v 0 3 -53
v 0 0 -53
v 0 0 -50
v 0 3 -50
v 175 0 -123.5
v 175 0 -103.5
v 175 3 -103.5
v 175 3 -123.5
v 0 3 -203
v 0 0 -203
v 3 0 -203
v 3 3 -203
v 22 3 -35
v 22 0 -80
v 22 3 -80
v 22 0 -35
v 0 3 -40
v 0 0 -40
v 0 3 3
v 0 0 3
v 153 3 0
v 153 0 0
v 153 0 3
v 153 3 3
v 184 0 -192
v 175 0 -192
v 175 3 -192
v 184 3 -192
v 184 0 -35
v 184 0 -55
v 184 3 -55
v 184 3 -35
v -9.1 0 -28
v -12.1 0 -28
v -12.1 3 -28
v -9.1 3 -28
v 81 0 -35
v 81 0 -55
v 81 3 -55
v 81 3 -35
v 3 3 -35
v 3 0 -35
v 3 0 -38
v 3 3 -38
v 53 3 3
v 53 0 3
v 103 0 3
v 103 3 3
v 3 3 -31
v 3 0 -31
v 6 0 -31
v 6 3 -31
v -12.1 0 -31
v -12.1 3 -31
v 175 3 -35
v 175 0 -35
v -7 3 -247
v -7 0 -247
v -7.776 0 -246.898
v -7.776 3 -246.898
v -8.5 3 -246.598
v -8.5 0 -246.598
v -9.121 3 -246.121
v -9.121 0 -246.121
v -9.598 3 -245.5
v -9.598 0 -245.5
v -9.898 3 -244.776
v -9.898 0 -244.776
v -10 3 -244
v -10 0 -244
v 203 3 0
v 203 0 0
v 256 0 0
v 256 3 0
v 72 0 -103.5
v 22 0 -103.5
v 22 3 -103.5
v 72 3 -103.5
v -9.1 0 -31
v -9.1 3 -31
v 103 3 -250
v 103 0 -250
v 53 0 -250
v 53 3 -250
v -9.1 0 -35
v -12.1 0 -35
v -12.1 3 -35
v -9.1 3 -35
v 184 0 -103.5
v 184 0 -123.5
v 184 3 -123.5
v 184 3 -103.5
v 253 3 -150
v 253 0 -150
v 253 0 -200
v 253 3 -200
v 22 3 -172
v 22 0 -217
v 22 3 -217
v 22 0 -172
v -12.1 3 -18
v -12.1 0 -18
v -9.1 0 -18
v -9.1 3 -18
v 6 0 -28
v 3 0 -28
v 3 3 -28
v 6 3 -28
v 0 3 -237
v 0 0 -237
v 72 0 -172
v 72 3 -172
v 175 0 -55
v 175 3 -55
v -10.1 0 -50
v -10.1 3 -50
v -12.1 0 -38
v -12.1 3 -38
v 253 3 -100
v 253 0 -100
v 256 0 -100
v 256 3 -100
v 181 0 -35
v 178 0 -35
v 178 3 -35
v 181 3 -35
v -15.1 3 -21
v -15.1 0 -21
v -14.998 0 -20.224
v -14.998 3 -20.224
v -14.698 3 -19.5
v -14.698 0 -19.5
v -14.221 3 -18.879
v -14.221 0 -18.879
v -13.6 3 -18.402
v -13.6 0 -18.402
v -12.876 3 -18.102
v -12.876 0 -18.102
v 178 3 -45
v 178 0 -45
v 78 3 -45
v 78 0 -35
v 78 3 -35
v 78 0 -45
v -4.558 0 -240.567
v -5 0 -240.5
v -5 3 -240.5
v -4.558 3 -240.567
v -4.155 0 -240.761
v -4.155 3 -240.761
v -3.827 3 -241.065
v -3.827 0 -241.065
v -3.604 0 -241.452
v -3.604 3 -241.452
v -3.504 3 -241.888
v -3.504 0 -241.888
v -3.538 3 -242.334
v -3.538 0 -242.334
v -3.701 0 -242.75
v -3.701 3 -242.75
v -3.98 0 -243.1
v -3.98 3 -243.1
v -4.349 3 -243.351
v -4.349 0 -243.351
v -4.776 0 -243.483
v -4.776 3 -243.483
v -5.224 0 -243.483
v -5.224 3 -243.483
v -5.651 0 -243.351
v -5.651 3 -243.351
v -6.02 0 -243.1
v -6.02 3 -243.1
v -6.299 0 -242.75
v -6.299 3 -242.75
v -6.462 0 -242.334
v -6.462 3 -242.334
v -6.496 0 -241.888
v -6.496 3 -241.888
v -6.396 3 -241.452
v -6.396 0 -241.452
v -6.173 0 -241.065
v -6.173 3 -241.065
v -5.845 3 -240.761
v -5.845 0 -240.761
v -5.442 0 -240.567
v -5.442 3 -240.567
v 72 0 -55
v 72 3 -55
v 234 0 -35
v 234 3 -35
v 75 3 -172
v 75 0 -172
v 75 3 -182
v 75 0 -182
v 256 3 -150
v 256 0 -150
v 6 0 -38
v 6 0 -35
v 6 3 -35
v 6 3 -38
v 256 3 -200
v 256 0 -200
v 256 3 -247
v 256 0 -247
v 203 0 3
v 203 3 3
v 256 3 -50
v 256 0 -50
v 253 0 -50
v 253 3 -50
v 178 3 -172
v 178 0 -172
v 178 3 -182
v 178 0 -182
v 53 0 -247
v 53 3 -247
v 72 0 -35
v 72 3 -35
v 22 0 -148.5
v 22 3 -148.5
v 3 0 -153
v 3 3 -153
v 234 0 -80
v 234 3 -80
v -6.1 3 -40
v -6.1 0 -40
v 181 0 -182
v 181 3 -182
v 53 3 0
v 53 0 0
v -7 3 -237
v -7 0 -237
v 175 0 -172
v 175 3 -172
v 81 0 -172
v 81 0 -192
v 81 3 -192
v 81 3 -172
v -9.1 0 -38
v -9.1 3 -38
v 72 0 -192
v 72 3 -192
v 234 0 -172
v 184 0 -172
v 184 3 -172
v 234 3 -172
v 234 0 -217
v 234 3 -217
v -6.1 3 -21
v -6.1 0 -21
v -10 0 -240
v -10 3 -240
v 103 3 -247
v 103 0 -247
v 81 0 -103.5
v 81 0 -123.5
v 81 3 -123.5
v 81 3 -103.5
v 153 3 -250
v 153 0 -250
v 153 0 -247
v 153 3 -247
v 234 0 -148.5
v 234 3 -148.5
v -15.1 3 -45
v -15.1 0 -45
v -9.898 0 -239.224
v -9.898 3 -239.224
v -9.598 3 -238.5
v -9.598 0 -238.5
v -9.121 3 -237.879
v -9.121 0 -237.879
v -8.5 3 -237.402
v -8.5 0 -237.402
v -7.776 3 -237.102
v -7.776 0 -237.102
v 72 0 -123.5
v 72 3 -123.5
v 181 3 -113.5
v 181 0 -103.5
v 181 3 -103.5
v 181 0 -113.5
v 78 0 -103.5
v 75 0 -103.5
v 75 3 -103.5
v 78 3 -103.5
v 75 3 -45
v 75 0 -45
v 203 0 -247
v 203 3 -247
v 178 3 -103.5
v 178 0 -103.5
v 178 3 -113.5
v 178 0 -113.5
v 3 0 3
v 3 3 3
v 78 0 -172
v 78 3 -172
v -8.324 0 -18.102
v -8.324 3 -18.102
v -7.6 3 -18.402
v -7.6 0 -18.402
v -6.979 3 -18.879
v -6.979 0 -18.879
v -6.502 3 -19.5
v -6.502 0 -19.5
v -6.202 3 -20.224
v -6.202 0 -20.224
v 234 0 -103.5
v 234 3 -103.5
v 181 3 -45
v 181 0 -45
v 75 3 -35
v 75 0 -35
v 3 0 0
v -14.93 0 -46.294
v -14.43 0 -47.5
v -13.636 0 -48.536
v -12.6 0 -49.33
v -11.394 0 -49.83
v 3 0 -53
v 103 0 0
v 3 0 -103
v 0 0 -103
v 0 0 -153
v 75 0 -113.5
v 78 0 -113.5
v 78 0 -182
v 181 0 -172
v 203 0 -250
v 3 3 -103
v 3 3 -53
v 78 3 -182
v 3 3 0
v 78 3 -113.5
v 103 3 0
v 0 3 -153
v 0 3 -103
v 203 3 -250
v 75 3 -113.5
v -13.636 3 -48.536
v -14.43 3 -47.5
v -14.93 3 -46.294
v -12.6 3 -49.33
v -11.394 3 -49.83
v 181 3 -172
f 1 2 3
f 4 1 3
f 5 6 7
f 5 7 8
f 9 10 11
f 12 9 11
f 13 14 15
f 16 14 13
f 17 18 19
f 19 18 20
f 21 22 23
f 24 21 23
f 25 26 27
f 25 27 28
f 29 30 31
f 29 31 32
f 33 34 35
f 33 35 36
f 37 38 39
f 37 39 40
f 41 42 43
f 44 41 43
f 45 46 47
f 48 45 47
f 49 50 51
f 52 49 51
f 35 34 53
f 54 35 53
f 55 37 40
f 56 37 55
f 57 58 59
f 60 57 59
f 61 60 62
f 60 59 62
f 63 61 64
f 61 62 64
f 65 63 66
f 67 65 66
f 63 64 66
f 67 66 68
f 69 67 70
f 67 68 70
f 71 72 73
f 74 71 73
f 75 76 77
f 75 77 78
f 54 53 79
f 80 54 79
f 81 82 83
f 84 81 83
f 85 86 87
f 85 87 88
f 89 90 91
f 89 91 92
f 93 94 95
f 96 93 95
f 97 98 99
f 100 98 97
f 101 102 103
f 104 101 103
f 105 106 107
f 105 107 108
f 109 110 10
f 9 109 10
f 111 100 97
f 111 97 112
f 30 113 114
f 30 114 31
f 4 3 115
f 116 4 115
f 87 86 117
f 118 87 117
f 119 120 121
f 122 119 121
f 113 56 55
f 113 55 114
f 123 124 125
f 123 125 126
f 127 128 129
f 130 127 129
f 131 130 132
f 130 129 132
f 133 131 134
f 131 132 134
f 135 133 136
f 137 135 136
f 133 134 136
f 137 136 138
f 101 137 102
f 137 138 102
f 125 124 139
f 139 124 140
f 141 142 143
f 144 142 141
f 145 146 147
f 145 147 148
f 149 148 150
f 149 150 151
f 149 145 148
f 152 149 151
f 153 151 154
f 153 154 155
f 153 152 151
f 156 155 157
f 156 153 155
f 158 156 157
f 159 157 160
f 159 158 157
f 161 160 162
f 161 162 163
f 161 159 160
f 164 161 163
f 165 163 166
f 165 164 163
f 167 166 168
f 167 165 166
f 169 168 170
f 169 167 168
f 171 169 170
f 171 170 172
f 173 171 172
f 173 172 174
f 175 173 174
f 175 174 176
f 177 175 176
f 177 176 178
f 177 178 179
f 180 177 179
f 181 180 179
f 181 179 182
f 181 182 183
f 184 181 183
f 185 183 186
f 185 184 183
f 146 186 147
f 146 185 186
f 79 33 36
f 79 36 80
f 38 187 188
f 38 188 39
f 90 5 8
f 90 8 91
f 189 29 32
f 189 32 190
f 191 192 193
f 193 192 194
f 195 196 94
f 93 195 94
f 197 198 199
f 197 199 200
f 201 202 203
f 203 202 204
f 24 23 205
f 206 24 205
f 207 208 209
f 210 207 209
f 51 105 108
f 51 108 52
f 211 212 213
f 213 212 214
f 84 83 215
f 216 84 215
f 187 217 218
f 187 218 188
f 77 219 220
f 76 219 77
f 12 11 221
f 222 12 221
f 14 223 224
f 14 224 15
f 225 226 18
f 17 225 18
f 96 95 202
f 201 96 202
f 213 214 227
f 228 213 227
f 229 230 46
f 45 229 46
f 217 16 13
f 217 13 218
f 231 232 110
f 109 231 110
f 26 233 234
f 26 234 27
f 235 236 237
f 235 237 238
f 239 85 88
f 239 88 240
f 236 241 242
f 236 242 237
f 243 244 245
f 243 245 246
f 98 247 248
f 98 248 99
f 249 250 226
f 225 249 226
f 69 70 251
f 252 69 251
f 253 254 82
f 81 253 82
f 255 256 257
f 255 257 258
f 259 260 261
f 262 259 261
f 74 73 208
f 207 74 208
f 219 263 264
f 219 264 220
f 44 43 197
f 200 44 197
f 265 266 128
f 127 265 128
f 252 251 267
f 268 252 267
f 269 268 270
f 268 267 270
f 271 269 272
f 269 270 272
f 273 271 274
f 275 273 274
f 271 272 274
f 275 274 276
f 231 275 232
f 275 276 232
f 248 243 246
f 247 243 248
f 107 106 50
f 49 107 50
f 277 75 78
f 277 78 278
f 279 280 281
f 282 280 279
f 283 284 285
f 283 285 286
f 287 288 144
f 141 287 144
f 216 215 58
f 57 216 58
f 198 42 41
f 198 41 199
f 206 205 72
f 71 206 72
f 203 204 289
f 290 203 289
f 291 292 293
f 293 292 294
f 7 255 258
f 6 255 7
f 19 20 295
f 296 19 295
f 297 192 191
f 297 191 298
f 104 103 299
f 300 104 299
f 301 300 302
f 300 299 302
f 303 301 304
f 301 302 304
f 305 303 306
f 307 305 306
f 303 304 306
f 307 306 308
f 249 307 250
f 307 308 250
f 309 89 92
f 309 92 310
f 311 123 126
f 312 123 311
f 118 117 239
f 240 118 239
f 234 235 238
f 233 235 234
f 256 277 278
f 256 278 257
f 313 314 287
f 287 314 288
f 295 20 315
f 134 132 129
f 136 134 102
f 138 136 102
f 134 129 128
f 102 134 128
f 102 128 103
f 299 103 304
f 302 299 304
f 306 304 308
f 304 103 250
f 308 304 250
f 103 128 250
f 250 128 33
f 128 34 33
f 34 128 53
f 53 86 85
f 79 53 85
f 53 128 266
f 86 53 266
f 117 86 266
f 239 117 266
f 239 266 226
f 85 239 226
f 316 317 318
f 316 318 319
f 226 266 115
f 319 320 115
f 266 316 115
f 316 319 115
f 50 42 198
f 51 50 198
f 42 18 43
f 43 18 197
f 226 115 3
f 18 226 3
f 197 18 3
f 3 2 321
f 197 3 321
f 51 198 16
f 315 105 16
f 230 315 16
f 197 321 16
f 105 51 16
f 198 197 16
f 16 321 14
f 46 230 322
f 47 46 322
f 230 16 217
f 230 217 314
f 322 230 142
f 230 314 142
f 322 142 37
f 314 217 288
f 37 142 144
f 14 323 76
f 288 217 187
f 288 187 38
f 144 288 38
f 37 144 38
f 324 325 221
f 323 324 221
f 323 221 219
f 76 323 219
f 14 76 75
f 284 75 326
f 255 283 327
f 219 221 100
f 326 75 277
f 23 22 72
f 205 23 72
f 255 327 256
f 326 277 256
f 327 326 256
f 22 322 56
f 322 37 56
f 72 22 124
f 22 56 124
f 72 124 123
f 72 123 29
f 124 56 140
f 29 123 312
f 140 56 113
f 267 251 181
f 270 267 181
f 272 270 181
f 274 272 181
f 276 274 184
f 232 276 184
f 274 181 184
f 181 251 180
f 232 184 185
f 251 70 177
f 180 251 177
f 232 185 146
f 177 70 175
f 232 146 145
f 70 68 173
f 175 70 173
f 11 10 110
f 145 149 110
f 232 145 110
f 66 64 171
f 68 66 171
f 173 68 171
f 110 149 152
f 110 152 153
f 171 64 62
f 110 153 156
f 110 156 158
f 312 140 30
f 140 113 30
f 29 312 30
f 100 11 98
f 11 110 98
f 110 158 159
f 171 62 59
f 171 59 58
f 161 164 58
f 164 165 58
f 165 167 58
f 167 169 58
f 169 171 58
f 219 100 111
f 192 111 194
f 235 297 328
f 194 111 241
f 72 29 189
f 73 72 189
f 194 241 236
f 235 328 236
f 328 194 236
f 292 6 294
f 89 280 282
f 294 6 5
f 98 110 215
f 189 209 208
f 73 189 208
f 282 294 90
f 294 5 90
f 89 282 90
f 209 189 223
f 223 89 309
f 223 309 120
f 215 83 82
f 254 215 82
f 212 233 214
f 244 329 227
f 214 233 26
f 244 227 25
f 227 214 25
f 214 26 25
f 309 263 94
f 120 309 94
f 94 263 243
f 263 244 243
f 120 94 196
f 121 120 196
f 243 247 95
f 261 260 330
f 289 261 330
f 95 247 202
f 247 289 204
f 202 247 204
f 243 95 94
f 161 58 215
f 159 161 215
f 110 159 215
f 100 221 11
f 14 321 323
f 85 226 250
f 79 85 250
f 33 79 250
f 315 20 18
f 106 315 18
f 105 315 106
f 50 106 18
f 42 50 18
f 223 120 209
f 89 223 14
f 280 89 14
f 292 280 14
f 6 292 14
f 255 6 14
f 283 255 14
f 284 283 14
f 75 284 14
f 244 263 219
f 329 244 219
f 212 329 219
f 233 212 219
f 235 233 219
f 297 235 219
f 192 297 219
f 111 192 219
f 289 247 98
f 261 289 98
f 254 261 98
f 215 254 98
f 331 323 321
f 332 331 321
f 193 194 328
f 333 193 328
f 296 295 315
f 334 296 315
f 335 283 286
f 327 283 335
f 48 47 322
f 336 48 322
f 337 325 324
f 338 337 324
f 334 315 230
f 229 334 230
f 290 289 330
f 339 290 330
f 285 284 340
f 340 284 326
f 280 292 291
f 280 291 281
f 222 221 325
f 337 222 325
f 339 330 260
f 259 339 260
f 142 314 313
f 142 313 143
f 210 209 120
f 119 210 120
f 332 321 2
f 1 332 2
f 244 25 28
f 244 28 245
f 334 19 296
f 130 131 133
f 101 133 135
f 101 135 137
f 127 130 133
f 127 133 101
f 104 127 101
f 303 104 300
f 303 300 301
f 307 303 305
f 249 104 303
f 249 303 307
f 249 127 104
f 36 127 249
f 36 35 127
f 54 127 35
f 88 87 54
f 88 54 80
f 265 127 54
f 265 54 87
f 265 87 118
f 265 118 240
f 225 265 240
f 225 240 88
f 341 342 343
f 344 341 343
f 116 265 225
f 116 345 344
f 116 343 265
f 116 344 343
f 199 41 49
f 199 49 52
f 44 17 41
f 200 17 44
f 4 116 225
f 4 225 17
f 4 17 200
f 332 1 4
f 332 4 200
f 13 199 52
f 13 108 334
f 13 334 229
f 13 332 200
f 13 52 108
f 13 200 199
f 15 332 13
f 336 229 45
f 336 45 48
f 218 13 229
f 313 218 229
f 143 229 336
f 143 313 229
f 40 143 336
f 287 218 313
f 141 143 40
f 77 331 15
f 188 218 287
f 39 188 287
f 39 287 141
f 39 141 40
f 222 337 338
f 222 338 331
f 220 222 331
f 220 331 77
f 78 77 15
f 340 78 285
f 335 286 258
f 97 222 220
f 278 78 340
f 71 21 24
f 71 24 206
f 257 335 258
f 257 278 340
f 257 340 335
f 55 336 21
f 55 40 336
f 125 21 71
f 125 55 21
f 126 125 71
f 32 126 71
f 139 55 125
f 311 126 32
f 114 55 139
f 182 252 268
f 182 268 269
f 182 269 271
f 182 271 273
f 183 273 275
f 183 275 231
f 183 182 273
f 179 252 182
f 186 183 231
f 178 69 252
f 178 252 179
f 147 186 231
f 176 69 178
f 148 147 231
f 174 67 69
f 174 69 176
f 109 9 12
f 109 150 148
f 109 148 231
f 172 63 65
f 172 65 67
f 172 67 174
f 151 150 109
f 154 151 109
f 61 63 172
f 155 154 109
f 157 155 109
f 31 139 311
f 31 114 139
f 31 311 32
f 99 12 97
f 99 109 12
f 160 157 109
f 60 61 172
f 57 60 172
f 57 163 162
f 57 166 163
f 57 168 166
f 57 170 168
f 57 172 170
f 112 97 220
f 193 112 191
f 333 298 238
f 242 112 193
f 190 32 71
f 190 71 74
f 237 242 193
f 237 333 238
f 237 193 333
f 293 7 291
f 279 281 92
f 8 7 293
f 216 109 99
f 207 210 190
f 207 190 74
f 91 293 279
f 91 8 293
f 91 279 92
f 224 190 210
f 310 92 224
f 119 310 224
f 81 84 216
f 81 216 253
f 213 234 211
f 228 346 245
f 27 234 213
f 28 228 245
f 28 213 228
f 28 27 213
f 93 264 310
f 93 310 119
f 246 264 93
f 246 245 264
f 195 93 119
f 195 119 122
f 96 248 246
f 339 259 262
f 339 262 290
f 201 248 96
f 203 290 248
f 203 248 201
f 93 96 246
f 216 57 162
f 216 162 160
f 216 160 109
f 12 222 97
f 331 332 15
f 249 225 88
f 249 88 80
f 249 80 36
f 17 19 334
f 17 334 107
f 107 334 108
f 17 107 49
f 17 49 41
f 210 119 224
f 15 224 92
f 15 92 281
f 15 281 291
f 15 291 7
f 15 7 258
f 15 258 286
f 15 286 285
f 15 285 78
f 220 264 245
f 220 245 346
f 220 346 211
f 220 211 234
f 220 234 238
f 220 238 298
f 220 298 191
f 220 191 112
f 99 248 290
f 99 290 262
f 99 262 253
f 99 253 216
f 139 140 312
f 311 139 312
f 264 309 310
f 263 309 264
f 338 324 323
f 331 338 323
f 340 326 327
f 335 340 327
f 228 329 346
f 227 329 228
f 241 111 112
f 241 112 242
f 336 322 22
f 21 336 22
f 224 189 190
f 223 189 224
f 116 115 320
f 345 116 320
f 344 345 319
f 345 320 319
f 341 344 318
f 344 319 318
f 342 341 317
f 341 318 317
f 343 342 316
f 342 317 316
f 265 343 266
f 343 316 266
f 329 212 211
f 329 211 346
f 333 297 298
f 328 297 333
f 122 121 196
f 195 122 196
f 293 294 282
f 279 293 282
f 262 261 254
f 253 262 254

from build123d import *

# Parameters (mm, degrees)
SKETCH1_R           = 1.5
SKETCH1_W           = 3
SKETCH1_H           = 3
SKETCH1_H_2         = 10
BOSS_EXTRUDE1_DEPTH = 3


with BuildPart() as part:
    # Sketch1 → Boss-Extrude1 (new body)
    with BuildSketch(Plane(origin=(0, 0, 0), x_dir=(1, 0, 0), z_dir=(0, 1, 0))):
        with BuildLine():
            Line((256, 100), (256, 150))
            Line((256, 150), (253, 150))
            Line((253, 150), (253, 200))
            Line((253, 200), (256, 200))
            Line((256, 200), (256, 247))
            Line((256, 247), (203, 247))
            Line((203, 247), (203, 250))
            Line((203, 250), (153, 250))
            Line((153, 250), (153, 247))
            Line((153, 247), (103, 247))
            Line((103, 247), (103, 250))
            Line((103, 250), (53, 250))
            Line((53, 250), (53, 247))
            Line((53, 247), (-7, 247))
            ThreePointArc((-7, 247), (-9.121320344, 246.121320344), (-10, 244))
            Line((-10, 244), (-10, 240))
            ThreePointArc((-10, 240), (-9.121320344, 237.878679656), (-7, 237))
            Line((-7, 237), (0, 237))
            Line((0, 237), (0, 203))
            Line((0, 203), (3, 203))
            Line((3, 203), (3, 153))
            Line((3, 153), (0, 153))
            Line((0, 153), (0, 103))
            Line((0, 103), (3, 103))
            Line((3, 103), (3, 53))
            Line((3, 53), (0, 53))
            Line((0, 53), (0, 50))
            Line((0, 50), (-10.1, 50))
            ThreePointArc((-10.1, 50), (-13.635533906, 48.535533906), (-15.1, 45))
            Line((-15.1, 45), (-15.1, 43))
            Line((-15.1, 43), (-15.1, 21))
            ThreePointArc((-15.1, 21), (-14.221320344, 18.878679656), (-12.1, 18))
            Line((-12.1, 18), (-9.1, 18))
            ThreePointArc((-9.1, 18), (-6.978679656, 18.878679656), (-6.1, 21))
            Line((-6.1, 21), (-6.1, 40))
            Line((-6.1, 40), (0, 40))
            Line((0, 40), (0, 0))
            Line((0, 0), (0, -3))
            Line((0, -3), (3, -3))
            Line((3, -3), (3, 0))
            Line((3, 0), (53, 0))
            Line((53, 0), (53, -3))
            Line((53, -3), (103, -3))
            Line((103, -3), (103, 0))
            Line((103, 0), (153, 0))
            Line((153, 0), (153, -3))
            Line((153, -3), (203, -3))
            Line((203, -3), (203, 0))
            Line((203, 0), (256, 0))
            Line((256, 0), (256, 50))
            Line((256, 50), (253, 50))
            Line((253, 50), (253, 100))
            Line((253, 100), (256, 100))
        make_face()
        with Locations(Location((-5, 242, 0), (0, 0, 270))):
            Circle(SKETCH1_R, mode=Mode.SUBTRACT)
        with Locations((-10.6, 29.5)):
            Rectangle(SKETCH1_W, SKETCH1_H, mode=Mode.SUBTRACT)
        Polygon((184, 172), (234, 172), (234, 217), (22, 217), (22, 172), (72, 172), (72, 192), (81, 192), (81, 172), (175, 172), (175, 192), (184, 192), align=None, mode=Mode.SUBTRACT)
        with Locations((-10.6, 36.5)):
            Rectangle(SKETCH1_W, SKETCH1_H, mode=Mode.SUBTRACT)
        with Locations((4.5, 29.5)):
            Rectangle(SKETCH1_W, SKETCH1_H, mode=Mode.SUBTRACT)
        with Locations((4.5, 36.5)):
            Rectangle(SKETCH1_W, SKETCH1_H, mode=Mode.SUBTRACT)
        with Locations((76.5, 40)):
            Rectangle(SKETCH1_W, SKETCH1_H_2, mode=Mode.SUBTRACT)
        with Locations((179.5, 40)):
            Rectangle(SKETCH1_W, SKETCH1_H_2, mode=Mode.SUBTRACT)
        with Locations((76.5, 108.5)):
            Rectangle(SKETCH1_W, SKETCH1_H_2, mode=Mode.SUBTRACT)
        with Locations((179.5, 108.5)):
            Rectangle(SKETCH1_W, SKETCH1_H_2, mode=Mode.SUBTRACT)
        with Locations((76.5, 177)):
            Rectangle(SKETCH1_W, SKETCH1_H_2, mode=Mode.SUBTRACT)
        with Locations((179.5, 177)):
            Rectangle(SKETCH1_W, SKETCH1_H_2, mode=Mode.SUBTRACT)
        Polygon((22, 35), (72, 35), (72, 55), (81, 55), (81, 35), (175, 35), (175, 55), (184, 55), (184, 35), (234, 35), (234, 80), (22, 80), align=None, mode=Mode.SUBTRACT)
        Polygon((22, 103.5), (72, 103.5), (72, 123.5), (81, 123.5), (81, 103.5), (175, 103.5), (175, 123.5), (184, 123.5), (184, 103.5), (234, 103.5), (234, 148.5), (22, 148.5), align=None, mode=Mode.SUBTRACT)
    extrude(amount=BOSS_EXTRUDE1_DEPTH)


solid = part.part
